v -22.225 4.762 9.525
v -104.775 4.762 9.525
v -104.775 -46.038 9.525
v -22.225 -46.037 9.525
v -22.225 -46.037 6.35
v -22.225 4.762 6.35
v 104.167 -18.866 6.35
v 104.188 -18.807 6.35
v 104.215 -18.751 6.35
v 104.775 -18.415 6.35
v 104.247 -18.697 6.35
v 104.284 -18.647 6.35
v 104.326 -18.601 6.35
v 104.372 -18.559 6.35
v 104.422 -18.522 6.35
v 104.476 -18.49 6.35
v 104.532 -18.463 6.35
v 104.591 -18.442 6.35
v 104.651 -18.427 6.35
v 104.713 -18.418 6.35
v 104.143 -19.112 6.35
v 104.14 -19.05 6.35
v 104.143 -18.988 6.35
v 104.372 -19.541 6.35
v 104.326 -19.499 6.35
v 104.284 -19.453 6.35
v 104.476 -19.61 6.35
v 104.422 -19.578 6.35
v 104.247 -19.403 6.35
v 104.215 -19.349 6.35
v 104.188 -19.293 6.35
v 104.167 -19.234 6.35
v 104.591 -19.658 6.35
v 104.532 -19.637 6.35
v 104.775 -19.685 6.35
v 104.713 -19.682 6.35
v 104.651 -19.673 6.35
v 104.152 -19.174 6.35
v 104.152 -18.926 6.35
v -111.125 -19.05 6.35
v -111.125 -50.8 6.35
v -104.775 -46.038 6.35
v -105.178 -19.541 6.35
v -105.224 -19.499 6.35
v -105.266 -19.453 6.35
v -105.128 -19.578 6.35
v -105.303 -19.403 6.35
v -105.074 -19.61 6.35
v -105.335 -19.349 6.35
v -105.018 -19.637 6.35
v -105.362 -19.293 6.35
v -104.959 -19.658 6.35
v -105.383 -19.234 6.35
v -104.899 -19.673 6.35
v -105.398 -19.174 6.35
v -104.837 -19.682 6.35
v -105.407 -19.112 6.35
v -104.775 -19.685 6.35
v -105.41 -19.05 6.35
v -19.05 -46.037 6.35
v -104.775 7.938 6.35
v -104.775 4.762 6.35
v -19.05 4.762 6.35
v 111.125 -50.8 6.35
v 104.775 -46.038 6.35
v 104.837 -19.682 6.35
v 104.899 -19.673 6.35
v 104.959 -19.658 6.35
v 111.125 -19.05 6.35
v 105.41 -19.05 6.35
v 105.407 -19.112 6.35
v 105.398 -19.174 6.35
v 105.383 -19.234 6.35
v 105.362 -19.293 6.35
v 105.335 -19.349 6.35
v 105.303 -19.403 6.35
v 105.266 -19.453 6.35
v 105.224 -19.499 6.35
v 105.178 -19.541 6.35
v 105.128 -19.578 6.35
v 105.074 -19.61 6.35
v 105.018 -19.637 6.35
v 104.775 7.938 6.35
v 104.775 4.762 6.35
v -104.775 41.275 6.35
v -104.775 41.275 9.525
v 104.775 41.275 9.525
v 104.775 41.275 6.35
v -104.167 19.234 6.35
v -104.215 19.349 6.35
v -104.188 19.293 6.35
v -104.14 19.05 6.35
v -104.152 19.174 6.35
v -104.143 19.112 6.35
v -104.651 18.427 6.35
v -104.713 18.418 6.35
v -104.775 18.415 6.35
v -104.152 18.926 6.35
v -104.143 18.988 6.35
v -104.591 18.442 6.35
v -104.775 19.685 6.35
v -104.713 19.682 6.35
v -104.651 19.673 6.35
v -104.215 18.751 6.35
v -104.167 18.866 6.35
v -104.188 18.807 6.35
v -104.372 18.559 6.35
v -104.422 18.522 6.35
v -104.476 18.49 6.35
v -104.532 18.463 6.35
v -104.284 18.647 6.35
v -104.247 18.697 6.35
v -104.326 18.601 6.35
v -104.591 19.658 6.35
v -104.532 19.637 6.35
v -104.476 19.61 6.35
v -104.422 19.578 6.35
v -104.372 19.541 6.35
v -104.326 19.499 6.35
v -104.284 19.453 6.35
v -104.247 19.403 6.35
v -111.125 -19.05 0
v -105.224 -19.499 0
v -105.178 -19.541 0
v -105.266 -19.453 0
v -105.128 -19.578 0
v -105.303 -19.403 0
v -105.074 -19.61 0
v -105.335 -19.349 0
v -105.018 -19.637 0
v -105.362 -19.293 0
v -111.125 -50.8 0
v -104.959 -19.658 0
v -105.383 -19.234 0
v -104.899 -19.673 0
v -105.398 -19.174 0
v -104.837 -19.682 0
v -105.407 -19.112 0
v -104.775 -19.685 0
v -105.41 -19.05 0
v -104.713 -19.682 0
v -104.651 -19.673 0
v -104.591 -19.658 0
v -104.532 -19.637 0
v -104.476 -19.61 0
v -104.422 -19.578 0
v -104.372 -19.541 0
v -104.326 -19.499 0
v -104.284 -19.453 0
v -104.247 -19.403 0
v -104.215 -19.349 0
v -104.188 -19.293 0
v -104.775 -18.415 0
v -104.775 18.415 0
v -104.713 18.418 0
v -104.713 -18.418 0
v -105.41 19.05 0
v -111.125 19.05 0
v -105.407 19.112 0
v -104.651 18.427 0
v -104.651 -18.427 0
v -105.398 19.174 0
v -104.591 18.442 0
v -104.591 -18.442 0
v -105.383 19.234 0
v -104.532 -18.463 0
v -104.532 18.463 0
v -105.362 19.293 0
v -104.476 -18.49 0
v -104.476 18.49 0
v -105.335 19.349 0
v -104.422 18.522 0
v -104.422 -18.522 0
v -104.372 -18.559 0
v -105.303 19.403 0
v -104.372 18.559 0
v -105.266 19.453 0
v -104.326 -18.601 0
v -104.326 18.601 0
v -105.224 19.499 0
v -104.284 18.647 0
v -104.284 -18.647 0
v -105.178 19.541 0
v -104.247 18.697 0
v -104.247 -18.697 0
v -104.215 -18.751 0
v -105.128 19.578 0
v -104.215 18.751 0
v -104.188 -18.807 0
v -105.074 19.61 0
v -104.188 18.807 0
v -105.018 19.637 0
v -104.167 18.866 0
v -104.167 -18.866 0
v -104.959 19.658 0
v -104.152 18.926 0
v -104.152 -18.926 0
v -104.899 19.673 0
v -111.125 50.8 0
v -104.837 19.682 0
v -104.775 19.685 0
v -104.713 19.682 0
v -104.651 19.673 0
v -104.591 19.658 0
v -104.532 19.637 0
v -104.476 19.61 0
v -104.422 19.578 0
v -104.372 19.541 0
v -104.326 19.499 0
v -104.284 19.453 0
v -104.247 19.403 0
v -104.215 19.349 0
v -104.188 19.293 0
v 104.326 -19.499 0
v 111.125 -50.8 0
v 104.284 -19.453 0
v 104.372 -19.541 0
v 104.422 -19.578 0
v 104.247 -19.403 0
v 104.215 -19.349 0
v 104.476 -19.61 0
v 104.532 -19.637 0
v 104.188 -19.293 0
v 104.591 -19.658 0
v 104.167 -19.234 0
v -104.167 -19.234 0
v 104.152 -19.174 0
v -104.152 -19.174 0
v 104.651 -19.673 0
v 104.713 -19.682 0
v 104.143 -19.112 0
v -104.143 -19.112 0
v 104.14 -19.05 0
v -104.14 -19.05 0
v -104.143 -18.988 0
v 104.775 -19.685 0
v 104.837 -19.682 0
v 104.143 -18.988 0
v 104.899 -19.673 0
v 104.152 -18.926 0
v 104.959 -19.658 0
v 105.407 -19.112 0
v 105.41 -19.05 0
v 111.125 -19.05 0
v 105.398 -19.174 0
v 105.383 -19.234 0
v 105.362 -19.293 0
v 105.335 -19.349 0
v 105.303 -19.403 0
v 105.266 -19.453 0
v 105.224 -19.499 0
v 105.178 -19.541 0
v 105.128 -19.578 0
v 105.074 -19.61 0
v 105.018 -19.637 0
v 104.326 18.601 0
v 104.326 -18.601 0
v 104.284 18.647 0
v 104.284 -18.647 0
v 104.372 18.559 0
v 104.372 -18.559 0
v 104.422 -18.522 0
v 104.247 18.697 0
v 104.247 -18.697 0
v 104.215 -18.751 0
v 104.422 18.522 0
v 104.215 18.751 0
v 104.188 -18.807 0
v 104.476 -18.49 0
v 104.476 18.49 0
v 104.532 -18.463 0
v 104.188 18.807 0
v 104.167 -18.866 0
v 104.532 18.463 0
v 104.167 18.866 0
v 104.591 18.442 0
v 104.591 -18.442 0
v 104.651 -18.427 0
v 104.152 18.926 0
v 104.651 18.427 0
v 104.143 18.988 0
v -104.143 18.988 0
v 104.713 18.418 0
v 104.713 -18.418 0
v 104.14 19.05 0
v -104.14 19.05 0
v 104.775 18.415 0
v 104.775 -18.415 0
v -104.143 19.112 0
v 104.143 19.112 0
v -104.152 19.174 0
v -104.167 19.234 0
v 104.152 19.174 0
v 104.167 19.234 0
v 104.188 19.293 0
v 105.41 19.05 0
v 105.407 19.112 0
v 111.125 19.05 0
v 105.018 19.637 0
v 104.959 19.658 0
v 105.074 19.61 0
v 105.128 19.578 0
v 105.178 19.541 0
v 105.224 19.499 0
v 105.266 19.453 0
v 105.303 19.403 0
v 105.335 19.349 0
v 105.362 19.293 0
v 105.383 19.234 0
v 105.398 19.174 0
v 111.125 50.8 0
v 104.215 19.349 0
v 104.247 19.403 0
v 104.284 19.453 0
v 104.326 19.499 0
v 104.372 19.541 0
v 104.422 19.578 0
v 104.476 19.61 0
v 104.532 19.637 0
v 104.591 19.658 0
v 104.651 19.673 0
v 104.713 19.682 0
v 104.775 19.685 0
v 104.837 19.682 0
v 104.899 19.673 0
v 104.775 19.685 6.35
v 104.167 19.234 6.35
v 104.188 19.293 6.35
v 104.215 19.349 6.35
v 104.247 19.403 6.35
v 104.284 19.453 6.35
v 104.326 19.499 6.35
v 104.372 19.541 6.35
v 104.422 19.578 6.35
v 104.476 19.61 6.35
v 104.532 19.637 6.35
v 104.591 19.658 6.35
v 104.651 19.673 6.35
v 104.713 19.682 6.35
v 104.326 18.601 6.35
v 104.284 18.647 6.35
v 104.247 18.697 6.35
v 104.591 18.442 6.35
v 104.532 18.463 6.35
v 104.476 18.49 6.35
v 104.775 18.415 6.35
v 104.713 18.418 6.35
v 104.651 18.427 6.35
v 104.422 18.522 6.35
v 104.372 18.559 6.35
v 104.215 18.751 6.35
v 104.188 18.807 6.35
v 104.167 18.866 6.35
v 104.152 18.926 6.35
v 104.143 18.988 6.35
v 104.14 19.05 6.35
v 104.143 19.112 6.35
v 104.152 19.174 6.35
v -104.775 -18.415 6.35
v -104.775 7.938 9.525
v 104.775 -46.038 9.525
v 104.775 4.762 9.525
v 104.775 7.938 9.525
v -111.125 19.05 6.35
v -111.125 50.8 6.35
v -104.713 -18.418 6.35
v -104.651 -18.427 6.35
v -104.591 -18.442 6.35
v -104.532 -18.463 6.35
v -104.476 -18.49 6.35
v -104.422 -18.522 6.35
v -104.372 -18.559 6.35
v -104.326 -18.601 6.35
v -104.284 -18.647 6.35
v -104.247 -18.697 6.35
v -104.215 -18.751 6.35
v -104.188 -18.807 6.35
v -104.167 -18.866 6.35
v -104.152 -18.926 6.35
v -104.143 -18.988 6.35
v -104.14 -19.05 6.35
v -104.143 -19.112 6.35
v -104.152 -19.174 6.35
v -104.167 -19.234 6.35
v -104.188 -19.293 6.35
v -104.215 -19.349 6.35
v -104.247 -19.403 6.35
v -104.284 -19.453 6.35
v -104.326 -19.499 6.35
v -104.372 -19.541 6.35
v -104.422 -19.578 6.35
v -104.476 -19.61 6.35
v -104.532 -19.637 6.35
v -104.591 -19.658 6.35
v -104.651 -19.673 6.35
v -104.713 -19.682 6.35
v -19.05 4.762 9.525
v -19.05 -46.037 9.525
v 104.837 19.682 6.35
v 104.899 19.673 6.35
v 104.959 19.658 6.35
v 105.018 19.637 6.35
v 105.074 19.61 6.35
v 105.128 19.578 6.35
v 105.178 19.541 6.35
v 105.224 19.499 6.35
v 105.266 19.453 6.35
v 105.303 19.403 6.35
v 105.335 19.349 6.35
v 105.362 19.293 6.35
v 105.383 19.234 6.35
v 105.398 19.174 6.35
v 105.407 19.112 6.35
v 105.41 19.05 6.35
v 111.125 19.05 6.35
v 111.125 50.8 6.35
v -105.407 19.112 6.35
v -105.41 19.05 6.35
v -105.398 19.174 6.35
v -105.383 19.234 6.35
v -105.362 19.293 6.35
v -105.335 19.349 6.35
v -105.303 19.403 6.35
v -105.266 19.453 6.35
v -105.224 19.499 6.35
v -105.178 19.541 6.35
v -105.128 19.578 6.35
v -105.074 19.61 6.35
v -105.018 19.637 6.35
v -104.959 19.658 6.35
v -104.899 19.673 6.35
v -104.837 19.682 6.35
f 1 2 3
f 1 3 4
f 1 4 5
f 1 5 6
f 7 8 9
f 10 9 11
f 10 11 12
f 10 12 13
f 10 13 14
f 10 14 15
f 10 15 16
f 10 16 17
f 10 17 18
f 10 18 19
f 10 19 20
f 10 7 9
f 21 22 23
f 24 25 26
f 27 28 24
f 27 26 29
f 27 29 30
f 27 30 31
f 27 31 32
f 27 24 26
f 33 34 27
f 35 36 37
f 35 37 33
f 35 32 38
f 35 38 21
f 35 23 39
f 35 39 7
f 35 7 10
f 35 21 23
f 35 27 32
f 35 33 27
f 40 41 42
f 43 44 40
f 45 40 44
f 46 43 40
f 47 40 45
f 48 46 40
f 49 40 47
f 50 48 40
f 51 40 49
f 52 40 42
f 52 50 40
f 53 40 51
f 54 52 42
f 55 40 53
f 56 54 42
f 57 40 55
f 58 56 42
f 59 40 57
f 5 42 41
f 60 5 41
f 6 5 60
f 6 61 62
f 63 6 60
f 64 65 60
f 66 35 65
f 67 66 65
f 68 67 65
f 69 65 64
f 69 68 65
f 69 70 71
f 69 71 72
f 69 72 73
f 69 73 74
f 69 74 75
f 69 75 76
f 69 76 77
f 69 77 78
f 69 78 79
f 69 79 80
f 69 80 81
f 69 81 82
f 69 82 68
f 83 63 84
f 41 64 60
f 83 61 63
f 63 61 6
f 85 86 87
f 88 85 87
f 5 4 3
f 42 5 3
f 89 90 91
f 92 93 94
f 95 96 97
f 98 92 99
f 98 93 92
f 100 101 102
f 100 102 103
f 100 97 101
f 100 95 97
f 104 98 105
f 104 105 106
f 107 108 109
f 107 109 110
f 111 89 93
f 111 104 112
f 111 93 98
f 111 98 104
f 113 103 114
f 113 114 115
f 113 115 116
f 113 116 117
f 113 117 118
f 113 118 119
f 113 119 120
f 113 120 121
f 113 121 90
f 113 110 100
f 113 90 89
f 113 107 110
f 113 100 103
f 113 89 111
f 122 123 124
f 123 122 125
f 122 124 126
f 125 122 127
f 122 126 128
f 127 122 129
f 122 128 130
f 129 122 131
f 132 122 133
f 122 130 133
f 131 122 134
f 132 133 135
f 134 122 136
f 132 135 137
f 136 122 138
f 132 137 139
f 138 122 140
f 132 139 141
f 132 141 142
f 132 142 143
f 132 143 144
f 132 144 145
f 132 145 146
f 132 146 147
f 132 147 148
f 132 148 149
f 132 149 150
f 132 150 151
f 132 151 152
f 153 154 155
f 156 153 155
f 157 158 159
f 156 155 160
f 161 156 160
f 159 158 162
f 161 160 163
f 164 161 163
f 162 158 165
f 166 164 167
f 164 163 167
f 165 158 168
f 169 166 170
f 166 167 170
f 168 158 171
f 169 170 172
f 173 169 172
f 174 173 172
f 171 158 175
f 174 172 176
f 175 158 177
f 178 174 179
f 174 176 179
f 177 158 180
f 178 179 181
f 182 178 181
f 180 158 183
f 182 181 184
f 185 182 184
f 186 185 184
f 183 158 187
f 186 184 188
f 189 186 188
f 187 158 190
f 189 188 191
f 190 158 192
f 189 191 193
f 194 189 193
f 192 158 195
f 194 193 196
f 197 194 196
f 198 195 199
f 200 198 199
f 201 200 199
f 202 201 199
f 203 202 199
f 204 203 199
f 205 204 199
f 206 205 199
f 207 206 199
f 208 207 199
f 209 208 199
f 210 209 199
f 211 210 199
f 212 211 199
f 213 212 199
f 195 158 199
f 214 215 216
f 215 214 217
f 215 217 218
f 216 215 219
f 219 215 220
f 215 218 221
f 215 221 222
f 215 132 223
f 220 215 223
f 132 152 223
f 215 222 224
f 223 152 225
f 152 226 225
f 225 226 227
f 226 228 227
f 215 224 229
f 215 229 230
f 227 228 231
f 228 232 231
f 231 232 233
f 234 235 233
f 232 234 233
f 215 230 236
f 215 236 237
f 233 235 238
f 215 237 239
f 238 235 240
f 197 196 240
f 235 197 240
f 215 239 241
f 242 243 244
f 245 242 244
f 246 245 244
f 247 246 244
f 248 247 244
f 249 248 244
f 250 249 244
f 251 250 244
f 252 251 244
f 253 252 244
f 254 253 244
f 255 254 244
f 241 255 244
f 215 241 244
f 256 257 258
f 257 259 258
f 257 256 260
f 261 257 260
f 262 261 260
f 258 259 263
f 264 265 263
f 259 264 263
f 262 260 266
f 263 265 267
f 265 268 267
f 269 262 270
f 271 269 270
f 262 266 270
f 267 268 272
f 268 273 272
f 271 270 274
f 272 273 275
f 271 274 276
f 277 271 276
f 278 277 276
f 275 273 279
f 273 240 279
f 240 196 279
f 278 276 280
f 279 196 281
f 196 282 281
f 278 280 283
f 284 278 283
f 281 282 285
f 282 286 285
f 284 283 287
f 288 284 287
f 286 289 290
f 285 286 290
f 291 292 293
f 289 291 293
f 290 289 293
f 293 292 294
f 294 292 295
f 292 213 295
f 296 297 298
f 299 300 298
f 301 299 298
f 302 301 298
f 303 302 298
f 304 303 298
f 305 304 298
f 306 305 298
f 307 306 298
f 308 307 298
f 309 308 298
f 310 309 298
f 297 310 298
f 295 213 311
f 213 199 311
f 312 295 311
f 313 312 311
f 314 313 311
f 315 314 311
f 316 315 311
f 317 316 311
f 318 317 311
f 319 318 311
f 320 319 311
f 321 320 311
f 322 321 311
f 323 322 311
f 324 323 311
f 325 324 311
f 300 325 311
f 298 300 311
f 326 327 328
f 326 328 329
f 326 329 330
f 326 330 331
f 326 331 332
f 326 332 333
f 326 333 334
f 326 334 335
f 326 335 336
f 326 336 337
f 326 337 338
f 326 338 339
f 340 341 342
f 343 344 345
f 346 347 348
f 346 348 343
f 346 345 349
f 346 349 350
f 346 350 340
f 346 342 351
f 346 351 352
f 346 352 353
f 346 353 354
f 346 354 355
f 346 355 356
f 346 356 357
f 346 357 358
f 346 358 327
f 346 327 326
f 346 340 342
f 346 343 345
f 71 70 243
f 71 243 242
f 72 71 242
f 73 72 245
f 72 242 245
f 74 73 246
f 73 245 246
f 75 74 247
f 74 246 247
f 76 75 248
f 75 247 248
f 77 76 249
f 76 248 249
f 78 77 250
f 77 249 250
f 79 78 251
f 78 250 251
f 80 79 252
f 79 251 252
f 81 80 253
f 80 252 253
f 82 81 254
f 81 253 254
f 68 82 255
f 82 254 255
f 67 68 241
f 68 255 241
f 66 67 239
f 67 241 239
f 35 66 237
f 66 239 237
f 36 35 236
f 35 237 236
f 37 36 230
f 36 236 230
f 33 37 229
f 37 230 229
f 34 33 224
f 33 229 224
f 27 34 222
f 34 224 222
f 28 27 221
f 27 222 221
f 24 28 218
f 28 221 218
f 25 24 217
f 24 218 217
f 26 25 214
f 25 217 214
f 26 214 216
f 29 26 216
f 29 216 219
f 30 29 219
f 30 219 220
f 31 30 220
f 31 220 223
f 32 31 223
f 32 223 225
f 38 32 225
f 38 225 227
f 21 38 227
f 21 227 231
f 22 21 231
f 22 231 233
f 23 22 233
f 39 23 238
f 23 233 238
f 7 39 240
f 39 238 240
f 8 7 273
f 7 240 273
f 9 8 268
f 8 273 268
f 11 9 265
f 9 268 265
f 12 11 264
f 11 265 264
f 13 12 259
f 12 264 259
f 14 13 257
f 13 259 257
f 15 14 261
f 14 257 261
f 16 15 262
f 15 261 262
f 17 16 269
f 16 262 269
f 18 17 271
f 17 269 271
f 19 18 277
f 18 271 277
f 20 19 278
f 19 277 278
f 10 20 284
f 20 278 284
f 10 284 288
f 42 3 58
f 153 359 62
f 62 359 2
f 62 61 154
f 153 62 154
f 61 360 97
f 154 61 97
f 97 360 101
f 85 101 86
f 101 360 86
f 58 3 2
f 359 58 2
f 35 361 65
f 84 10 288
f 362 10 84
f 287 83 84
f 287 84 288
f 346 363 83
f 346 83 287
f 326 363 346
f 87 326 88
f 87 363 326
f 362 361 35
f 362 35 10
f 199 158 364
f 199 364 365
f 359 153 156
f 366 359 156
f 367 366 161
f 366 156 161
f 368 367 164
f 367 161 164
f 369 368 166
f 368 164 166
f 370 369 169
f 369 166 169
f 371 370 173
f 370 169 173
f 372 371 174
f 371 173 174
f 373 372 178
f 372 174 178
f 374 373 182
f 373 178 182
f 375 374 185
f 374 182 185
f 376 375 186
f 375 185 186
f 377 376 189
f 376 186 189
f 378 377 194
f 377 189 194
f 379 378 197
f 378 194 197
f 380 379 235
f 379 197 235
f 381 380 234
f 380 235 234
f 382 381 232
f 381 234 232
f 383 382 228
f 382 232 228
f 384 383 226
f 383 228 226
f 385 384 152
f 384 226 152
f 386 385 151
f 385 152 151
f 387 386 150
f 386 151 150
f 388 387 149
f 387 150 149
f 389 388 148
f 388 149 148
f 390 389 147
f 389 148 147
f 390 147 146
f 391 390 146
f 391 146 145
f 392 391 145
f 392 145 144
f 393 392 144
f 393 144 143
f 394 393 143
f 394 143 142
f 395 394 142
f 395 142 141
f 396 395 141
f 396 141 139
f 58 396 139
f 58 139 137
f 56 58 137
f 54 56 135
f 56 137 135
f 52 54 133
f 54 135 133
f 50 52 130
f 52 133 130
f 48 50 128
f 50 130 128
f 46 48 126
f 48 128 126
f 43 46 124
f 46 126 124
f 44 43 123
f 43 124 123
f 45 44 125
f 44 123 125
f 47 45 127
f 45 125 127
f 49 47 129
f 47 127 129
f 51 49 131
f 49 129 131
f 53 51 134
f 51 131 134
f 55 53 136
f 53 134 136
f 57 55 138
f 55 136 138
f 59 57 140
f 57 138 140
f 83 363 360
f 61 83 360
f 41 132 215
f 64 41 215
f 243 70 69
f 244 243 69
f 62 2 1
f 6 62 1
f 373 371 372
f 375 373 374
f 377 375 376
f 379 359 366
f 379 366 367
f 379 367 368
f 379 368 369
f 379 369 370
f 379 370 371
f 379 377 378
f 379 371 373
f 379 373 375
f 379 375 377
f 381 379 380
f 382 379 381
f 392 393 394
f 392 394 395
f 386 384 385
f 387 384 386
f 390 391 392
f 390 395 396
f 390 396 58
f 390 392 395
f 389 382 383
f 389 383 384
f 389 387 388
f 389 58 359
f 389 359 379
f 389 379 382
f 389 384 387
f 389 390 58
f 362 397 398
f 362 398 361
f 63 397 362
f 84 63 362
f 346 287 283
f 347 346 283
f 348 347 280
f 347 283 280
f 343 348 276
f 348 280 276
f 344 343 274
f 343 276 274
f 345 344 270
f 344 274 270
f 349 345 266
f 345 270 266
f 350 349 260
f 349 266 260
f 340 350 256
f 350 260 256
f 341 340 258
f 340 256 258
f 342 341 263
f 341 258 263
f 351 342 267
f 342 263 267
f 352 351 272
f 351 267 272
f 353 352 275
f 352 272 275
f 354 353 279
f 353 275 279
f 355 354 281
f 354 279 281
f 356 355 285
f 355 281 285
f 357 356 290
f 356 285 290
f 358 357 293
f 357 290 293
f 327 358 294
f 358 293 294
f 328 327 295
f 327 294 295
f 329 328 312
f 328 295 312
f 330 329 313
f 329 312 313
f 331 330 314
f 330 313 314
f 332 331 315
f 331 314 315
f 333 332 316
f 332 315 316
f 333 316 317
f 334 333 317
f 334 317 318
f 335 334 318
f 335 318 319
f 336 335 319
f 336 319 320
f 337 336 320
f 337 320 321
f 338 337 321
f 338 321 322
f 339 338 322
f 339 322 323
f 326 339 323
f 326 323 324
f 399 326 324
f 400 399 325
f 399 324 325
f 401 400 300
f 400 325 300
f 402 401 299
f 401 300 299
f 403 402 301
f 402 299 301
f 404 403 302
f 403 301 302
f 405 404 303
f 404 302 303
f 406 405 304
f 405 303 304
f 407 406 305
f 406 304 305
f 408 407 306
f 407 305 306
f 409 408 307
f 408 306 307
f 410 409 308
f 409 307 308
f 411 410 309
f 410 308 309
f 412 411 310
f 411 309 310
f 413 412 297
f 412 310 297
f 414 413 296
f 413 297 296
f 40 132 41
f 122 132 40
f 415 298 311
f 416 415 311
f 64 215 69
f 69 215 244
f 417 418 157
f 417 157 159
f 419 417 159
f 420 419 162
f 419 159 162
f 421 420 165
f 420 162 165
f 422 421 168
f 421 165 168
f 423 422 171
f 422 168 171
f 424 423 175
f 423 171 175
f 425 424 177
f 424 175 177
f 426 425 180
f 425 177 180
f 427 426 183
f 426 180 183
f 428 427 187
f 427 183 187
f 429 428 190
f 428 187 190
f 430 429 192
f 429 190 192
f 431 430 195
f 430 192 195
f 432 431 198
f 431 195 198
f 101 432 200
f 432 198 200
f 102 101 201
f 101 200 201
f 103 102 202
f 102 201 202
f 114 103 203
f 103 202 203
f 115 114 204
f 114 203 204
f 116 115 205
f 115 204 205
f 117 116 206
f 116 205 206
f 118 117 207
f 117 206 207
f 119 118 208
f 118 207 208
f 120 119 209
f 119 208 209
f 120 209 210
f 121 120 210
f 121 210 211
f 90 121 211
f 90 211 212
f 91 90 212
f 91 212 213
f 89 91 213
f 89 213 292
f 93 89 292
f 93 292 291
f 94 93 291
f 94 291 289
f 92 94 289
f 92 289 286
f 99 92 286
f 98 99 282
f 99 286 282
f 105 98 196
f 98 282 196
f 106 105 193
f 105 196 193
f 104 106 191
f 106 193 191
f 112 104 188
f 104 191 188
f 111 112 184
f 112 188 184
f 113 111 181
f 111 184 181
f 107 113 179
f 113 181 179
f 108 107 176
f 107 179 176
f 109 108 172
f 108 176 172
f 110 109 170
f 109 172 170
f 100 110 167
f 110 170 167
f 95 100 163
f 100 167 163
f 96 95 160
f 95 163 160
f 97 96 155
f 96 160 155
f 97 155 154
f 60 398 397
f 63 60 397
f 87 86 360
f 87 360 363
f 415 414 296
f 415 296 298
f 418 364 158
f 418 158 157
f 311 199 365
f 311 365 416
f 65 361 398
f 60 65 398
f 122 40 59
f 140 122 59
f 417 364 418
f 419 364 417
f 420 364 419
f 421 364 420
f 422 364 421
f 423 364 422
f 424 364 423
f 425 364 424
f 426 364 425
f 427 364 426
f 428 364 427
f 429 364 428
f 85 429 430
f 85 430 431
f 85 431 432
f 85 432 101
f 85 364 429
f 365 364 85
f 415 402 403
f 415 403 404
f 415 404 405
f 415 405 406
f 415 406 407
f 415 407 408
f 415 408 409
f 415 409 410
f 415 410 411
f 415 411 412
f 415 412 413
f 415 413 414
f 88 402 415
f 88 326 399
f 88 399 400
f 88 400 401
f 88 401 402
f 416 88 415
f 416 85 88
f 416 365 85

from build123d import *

# Parameters (mm, degrees)
F0_W     = 222.25
F0_H     = 101.6
F1_DEPTH = 9.525
F2_W     = 6.35
F2_H     = 38.1
F3_DEPTH = 9.526
F5_DEPTH = 3.175
F6_W     = 3.175
F6_H     = 50.8
F7_DEPTH = 3.175
F9_DEPTH = 6.35


with BuildPart() as f1:
    # F0 (on Top) → F1 (new body)
    with BuildSketch(Plane.XY):
        Rectangle(F0_W, F0_H)
    extrude(amount=F1_DEPTH)

    # F2 (on face) → F3 (cut, through all)
    with BuildSketch(Plane.XY.offset(9.525)):
        with Locations((-107.95, 0)):
            Rectangle(F2_W, F2_H)
        with Locations((107.95, 0)):
            Rectangle(F2_W, F2_H)
    extrude(amount=-F3_DEPTH, mode=Mode.SUBTRACT)

    # F4 (on face) → F5 (cut)
    with BuildSketch(Plane.XY.offset(9.525)):
        Polygon((-104.775, -46.0375), (-104.775, -19.05), (-111.125, -19.05), (-111.125, -50.8), (111.125, -50.8), (111.125, -19.05), (104.775, -19.05), (104.775, -46.0375), align=None)
        Polygon((-111.125, 19.05), (-104.775, 19.05), (-104.775, 41.275), (104.775, 41.275), (104.775, 19.05), (111.125, 19.05), (111.125, 50.8), (-111.125, 50.8), align=None)
    extrude(amount=-F5_DEPTH, mode=Mode.SUBTRACT)

    # F6 (on face) → F7 (cut)
    with BuildSketch(Plane.XY.offset(9.525)):
        Polygon((104.775, 7.9375), (-104.775, 7.9375), (-104.775, 4.7625), (-22.225, 4.7625), (-19.05, 4.7625), (104.775, 4.7625), align=None)
        with Locations((-20.6375, -20.6375)):
            Rectangle(F6_W, F6_H)
    extrude(amount=-F7_DEPTH, mode=Mode.SUBTRACT)

    # F8 (on face) → F9 (cut, through all)
    with BuildSketch(Plane(origin=(0, 0, 0), x_dir=(1, 0, 0), z_dir=(0, 0, -1))):
        with BuildLine():
            ThreePointArc((105.41, 19.05), (104.325987, 19.499013), (104.775, 18.415))
            Line((104.775, 18.415), (104.775, 19.05))
            Line((104.775, 19.05), (105.41, 19.05))
        make_face()
        with BuildLine():
            ThreePointArc((104.775, -18.415), (104.325987, -19.499013), (105.41, -19.05))
            Line((105.41, -19.05), (104.775, -19.05))
            Line((104.775, -19.05), (104.775, -18.415))
        make_face()
        with BuildLine():
            Line((-104.775, -19.05), (-105.41, -19.05))
            ThreePointArc((-105.41, -19.05), (-104.325987, -19.499013), (-104.775, -18.415))
            Line((-104.775, -18.415), (-104.775, -19.05))
        make_face()
        with BuildLine():
            Line((-104.775, 19.05), (-104.775, 18.415))
            ThreePointArc((-104.775, 18.415), (-104.325987, 19.499013), (-105.41, 19.05))
            Line((-105.41, 19.05), (-104.775, 19.05))
        make_face()
    extrude(amount=-F9_DEPTH, mode=Mode.SUBTRACT)


solid = f1.part
